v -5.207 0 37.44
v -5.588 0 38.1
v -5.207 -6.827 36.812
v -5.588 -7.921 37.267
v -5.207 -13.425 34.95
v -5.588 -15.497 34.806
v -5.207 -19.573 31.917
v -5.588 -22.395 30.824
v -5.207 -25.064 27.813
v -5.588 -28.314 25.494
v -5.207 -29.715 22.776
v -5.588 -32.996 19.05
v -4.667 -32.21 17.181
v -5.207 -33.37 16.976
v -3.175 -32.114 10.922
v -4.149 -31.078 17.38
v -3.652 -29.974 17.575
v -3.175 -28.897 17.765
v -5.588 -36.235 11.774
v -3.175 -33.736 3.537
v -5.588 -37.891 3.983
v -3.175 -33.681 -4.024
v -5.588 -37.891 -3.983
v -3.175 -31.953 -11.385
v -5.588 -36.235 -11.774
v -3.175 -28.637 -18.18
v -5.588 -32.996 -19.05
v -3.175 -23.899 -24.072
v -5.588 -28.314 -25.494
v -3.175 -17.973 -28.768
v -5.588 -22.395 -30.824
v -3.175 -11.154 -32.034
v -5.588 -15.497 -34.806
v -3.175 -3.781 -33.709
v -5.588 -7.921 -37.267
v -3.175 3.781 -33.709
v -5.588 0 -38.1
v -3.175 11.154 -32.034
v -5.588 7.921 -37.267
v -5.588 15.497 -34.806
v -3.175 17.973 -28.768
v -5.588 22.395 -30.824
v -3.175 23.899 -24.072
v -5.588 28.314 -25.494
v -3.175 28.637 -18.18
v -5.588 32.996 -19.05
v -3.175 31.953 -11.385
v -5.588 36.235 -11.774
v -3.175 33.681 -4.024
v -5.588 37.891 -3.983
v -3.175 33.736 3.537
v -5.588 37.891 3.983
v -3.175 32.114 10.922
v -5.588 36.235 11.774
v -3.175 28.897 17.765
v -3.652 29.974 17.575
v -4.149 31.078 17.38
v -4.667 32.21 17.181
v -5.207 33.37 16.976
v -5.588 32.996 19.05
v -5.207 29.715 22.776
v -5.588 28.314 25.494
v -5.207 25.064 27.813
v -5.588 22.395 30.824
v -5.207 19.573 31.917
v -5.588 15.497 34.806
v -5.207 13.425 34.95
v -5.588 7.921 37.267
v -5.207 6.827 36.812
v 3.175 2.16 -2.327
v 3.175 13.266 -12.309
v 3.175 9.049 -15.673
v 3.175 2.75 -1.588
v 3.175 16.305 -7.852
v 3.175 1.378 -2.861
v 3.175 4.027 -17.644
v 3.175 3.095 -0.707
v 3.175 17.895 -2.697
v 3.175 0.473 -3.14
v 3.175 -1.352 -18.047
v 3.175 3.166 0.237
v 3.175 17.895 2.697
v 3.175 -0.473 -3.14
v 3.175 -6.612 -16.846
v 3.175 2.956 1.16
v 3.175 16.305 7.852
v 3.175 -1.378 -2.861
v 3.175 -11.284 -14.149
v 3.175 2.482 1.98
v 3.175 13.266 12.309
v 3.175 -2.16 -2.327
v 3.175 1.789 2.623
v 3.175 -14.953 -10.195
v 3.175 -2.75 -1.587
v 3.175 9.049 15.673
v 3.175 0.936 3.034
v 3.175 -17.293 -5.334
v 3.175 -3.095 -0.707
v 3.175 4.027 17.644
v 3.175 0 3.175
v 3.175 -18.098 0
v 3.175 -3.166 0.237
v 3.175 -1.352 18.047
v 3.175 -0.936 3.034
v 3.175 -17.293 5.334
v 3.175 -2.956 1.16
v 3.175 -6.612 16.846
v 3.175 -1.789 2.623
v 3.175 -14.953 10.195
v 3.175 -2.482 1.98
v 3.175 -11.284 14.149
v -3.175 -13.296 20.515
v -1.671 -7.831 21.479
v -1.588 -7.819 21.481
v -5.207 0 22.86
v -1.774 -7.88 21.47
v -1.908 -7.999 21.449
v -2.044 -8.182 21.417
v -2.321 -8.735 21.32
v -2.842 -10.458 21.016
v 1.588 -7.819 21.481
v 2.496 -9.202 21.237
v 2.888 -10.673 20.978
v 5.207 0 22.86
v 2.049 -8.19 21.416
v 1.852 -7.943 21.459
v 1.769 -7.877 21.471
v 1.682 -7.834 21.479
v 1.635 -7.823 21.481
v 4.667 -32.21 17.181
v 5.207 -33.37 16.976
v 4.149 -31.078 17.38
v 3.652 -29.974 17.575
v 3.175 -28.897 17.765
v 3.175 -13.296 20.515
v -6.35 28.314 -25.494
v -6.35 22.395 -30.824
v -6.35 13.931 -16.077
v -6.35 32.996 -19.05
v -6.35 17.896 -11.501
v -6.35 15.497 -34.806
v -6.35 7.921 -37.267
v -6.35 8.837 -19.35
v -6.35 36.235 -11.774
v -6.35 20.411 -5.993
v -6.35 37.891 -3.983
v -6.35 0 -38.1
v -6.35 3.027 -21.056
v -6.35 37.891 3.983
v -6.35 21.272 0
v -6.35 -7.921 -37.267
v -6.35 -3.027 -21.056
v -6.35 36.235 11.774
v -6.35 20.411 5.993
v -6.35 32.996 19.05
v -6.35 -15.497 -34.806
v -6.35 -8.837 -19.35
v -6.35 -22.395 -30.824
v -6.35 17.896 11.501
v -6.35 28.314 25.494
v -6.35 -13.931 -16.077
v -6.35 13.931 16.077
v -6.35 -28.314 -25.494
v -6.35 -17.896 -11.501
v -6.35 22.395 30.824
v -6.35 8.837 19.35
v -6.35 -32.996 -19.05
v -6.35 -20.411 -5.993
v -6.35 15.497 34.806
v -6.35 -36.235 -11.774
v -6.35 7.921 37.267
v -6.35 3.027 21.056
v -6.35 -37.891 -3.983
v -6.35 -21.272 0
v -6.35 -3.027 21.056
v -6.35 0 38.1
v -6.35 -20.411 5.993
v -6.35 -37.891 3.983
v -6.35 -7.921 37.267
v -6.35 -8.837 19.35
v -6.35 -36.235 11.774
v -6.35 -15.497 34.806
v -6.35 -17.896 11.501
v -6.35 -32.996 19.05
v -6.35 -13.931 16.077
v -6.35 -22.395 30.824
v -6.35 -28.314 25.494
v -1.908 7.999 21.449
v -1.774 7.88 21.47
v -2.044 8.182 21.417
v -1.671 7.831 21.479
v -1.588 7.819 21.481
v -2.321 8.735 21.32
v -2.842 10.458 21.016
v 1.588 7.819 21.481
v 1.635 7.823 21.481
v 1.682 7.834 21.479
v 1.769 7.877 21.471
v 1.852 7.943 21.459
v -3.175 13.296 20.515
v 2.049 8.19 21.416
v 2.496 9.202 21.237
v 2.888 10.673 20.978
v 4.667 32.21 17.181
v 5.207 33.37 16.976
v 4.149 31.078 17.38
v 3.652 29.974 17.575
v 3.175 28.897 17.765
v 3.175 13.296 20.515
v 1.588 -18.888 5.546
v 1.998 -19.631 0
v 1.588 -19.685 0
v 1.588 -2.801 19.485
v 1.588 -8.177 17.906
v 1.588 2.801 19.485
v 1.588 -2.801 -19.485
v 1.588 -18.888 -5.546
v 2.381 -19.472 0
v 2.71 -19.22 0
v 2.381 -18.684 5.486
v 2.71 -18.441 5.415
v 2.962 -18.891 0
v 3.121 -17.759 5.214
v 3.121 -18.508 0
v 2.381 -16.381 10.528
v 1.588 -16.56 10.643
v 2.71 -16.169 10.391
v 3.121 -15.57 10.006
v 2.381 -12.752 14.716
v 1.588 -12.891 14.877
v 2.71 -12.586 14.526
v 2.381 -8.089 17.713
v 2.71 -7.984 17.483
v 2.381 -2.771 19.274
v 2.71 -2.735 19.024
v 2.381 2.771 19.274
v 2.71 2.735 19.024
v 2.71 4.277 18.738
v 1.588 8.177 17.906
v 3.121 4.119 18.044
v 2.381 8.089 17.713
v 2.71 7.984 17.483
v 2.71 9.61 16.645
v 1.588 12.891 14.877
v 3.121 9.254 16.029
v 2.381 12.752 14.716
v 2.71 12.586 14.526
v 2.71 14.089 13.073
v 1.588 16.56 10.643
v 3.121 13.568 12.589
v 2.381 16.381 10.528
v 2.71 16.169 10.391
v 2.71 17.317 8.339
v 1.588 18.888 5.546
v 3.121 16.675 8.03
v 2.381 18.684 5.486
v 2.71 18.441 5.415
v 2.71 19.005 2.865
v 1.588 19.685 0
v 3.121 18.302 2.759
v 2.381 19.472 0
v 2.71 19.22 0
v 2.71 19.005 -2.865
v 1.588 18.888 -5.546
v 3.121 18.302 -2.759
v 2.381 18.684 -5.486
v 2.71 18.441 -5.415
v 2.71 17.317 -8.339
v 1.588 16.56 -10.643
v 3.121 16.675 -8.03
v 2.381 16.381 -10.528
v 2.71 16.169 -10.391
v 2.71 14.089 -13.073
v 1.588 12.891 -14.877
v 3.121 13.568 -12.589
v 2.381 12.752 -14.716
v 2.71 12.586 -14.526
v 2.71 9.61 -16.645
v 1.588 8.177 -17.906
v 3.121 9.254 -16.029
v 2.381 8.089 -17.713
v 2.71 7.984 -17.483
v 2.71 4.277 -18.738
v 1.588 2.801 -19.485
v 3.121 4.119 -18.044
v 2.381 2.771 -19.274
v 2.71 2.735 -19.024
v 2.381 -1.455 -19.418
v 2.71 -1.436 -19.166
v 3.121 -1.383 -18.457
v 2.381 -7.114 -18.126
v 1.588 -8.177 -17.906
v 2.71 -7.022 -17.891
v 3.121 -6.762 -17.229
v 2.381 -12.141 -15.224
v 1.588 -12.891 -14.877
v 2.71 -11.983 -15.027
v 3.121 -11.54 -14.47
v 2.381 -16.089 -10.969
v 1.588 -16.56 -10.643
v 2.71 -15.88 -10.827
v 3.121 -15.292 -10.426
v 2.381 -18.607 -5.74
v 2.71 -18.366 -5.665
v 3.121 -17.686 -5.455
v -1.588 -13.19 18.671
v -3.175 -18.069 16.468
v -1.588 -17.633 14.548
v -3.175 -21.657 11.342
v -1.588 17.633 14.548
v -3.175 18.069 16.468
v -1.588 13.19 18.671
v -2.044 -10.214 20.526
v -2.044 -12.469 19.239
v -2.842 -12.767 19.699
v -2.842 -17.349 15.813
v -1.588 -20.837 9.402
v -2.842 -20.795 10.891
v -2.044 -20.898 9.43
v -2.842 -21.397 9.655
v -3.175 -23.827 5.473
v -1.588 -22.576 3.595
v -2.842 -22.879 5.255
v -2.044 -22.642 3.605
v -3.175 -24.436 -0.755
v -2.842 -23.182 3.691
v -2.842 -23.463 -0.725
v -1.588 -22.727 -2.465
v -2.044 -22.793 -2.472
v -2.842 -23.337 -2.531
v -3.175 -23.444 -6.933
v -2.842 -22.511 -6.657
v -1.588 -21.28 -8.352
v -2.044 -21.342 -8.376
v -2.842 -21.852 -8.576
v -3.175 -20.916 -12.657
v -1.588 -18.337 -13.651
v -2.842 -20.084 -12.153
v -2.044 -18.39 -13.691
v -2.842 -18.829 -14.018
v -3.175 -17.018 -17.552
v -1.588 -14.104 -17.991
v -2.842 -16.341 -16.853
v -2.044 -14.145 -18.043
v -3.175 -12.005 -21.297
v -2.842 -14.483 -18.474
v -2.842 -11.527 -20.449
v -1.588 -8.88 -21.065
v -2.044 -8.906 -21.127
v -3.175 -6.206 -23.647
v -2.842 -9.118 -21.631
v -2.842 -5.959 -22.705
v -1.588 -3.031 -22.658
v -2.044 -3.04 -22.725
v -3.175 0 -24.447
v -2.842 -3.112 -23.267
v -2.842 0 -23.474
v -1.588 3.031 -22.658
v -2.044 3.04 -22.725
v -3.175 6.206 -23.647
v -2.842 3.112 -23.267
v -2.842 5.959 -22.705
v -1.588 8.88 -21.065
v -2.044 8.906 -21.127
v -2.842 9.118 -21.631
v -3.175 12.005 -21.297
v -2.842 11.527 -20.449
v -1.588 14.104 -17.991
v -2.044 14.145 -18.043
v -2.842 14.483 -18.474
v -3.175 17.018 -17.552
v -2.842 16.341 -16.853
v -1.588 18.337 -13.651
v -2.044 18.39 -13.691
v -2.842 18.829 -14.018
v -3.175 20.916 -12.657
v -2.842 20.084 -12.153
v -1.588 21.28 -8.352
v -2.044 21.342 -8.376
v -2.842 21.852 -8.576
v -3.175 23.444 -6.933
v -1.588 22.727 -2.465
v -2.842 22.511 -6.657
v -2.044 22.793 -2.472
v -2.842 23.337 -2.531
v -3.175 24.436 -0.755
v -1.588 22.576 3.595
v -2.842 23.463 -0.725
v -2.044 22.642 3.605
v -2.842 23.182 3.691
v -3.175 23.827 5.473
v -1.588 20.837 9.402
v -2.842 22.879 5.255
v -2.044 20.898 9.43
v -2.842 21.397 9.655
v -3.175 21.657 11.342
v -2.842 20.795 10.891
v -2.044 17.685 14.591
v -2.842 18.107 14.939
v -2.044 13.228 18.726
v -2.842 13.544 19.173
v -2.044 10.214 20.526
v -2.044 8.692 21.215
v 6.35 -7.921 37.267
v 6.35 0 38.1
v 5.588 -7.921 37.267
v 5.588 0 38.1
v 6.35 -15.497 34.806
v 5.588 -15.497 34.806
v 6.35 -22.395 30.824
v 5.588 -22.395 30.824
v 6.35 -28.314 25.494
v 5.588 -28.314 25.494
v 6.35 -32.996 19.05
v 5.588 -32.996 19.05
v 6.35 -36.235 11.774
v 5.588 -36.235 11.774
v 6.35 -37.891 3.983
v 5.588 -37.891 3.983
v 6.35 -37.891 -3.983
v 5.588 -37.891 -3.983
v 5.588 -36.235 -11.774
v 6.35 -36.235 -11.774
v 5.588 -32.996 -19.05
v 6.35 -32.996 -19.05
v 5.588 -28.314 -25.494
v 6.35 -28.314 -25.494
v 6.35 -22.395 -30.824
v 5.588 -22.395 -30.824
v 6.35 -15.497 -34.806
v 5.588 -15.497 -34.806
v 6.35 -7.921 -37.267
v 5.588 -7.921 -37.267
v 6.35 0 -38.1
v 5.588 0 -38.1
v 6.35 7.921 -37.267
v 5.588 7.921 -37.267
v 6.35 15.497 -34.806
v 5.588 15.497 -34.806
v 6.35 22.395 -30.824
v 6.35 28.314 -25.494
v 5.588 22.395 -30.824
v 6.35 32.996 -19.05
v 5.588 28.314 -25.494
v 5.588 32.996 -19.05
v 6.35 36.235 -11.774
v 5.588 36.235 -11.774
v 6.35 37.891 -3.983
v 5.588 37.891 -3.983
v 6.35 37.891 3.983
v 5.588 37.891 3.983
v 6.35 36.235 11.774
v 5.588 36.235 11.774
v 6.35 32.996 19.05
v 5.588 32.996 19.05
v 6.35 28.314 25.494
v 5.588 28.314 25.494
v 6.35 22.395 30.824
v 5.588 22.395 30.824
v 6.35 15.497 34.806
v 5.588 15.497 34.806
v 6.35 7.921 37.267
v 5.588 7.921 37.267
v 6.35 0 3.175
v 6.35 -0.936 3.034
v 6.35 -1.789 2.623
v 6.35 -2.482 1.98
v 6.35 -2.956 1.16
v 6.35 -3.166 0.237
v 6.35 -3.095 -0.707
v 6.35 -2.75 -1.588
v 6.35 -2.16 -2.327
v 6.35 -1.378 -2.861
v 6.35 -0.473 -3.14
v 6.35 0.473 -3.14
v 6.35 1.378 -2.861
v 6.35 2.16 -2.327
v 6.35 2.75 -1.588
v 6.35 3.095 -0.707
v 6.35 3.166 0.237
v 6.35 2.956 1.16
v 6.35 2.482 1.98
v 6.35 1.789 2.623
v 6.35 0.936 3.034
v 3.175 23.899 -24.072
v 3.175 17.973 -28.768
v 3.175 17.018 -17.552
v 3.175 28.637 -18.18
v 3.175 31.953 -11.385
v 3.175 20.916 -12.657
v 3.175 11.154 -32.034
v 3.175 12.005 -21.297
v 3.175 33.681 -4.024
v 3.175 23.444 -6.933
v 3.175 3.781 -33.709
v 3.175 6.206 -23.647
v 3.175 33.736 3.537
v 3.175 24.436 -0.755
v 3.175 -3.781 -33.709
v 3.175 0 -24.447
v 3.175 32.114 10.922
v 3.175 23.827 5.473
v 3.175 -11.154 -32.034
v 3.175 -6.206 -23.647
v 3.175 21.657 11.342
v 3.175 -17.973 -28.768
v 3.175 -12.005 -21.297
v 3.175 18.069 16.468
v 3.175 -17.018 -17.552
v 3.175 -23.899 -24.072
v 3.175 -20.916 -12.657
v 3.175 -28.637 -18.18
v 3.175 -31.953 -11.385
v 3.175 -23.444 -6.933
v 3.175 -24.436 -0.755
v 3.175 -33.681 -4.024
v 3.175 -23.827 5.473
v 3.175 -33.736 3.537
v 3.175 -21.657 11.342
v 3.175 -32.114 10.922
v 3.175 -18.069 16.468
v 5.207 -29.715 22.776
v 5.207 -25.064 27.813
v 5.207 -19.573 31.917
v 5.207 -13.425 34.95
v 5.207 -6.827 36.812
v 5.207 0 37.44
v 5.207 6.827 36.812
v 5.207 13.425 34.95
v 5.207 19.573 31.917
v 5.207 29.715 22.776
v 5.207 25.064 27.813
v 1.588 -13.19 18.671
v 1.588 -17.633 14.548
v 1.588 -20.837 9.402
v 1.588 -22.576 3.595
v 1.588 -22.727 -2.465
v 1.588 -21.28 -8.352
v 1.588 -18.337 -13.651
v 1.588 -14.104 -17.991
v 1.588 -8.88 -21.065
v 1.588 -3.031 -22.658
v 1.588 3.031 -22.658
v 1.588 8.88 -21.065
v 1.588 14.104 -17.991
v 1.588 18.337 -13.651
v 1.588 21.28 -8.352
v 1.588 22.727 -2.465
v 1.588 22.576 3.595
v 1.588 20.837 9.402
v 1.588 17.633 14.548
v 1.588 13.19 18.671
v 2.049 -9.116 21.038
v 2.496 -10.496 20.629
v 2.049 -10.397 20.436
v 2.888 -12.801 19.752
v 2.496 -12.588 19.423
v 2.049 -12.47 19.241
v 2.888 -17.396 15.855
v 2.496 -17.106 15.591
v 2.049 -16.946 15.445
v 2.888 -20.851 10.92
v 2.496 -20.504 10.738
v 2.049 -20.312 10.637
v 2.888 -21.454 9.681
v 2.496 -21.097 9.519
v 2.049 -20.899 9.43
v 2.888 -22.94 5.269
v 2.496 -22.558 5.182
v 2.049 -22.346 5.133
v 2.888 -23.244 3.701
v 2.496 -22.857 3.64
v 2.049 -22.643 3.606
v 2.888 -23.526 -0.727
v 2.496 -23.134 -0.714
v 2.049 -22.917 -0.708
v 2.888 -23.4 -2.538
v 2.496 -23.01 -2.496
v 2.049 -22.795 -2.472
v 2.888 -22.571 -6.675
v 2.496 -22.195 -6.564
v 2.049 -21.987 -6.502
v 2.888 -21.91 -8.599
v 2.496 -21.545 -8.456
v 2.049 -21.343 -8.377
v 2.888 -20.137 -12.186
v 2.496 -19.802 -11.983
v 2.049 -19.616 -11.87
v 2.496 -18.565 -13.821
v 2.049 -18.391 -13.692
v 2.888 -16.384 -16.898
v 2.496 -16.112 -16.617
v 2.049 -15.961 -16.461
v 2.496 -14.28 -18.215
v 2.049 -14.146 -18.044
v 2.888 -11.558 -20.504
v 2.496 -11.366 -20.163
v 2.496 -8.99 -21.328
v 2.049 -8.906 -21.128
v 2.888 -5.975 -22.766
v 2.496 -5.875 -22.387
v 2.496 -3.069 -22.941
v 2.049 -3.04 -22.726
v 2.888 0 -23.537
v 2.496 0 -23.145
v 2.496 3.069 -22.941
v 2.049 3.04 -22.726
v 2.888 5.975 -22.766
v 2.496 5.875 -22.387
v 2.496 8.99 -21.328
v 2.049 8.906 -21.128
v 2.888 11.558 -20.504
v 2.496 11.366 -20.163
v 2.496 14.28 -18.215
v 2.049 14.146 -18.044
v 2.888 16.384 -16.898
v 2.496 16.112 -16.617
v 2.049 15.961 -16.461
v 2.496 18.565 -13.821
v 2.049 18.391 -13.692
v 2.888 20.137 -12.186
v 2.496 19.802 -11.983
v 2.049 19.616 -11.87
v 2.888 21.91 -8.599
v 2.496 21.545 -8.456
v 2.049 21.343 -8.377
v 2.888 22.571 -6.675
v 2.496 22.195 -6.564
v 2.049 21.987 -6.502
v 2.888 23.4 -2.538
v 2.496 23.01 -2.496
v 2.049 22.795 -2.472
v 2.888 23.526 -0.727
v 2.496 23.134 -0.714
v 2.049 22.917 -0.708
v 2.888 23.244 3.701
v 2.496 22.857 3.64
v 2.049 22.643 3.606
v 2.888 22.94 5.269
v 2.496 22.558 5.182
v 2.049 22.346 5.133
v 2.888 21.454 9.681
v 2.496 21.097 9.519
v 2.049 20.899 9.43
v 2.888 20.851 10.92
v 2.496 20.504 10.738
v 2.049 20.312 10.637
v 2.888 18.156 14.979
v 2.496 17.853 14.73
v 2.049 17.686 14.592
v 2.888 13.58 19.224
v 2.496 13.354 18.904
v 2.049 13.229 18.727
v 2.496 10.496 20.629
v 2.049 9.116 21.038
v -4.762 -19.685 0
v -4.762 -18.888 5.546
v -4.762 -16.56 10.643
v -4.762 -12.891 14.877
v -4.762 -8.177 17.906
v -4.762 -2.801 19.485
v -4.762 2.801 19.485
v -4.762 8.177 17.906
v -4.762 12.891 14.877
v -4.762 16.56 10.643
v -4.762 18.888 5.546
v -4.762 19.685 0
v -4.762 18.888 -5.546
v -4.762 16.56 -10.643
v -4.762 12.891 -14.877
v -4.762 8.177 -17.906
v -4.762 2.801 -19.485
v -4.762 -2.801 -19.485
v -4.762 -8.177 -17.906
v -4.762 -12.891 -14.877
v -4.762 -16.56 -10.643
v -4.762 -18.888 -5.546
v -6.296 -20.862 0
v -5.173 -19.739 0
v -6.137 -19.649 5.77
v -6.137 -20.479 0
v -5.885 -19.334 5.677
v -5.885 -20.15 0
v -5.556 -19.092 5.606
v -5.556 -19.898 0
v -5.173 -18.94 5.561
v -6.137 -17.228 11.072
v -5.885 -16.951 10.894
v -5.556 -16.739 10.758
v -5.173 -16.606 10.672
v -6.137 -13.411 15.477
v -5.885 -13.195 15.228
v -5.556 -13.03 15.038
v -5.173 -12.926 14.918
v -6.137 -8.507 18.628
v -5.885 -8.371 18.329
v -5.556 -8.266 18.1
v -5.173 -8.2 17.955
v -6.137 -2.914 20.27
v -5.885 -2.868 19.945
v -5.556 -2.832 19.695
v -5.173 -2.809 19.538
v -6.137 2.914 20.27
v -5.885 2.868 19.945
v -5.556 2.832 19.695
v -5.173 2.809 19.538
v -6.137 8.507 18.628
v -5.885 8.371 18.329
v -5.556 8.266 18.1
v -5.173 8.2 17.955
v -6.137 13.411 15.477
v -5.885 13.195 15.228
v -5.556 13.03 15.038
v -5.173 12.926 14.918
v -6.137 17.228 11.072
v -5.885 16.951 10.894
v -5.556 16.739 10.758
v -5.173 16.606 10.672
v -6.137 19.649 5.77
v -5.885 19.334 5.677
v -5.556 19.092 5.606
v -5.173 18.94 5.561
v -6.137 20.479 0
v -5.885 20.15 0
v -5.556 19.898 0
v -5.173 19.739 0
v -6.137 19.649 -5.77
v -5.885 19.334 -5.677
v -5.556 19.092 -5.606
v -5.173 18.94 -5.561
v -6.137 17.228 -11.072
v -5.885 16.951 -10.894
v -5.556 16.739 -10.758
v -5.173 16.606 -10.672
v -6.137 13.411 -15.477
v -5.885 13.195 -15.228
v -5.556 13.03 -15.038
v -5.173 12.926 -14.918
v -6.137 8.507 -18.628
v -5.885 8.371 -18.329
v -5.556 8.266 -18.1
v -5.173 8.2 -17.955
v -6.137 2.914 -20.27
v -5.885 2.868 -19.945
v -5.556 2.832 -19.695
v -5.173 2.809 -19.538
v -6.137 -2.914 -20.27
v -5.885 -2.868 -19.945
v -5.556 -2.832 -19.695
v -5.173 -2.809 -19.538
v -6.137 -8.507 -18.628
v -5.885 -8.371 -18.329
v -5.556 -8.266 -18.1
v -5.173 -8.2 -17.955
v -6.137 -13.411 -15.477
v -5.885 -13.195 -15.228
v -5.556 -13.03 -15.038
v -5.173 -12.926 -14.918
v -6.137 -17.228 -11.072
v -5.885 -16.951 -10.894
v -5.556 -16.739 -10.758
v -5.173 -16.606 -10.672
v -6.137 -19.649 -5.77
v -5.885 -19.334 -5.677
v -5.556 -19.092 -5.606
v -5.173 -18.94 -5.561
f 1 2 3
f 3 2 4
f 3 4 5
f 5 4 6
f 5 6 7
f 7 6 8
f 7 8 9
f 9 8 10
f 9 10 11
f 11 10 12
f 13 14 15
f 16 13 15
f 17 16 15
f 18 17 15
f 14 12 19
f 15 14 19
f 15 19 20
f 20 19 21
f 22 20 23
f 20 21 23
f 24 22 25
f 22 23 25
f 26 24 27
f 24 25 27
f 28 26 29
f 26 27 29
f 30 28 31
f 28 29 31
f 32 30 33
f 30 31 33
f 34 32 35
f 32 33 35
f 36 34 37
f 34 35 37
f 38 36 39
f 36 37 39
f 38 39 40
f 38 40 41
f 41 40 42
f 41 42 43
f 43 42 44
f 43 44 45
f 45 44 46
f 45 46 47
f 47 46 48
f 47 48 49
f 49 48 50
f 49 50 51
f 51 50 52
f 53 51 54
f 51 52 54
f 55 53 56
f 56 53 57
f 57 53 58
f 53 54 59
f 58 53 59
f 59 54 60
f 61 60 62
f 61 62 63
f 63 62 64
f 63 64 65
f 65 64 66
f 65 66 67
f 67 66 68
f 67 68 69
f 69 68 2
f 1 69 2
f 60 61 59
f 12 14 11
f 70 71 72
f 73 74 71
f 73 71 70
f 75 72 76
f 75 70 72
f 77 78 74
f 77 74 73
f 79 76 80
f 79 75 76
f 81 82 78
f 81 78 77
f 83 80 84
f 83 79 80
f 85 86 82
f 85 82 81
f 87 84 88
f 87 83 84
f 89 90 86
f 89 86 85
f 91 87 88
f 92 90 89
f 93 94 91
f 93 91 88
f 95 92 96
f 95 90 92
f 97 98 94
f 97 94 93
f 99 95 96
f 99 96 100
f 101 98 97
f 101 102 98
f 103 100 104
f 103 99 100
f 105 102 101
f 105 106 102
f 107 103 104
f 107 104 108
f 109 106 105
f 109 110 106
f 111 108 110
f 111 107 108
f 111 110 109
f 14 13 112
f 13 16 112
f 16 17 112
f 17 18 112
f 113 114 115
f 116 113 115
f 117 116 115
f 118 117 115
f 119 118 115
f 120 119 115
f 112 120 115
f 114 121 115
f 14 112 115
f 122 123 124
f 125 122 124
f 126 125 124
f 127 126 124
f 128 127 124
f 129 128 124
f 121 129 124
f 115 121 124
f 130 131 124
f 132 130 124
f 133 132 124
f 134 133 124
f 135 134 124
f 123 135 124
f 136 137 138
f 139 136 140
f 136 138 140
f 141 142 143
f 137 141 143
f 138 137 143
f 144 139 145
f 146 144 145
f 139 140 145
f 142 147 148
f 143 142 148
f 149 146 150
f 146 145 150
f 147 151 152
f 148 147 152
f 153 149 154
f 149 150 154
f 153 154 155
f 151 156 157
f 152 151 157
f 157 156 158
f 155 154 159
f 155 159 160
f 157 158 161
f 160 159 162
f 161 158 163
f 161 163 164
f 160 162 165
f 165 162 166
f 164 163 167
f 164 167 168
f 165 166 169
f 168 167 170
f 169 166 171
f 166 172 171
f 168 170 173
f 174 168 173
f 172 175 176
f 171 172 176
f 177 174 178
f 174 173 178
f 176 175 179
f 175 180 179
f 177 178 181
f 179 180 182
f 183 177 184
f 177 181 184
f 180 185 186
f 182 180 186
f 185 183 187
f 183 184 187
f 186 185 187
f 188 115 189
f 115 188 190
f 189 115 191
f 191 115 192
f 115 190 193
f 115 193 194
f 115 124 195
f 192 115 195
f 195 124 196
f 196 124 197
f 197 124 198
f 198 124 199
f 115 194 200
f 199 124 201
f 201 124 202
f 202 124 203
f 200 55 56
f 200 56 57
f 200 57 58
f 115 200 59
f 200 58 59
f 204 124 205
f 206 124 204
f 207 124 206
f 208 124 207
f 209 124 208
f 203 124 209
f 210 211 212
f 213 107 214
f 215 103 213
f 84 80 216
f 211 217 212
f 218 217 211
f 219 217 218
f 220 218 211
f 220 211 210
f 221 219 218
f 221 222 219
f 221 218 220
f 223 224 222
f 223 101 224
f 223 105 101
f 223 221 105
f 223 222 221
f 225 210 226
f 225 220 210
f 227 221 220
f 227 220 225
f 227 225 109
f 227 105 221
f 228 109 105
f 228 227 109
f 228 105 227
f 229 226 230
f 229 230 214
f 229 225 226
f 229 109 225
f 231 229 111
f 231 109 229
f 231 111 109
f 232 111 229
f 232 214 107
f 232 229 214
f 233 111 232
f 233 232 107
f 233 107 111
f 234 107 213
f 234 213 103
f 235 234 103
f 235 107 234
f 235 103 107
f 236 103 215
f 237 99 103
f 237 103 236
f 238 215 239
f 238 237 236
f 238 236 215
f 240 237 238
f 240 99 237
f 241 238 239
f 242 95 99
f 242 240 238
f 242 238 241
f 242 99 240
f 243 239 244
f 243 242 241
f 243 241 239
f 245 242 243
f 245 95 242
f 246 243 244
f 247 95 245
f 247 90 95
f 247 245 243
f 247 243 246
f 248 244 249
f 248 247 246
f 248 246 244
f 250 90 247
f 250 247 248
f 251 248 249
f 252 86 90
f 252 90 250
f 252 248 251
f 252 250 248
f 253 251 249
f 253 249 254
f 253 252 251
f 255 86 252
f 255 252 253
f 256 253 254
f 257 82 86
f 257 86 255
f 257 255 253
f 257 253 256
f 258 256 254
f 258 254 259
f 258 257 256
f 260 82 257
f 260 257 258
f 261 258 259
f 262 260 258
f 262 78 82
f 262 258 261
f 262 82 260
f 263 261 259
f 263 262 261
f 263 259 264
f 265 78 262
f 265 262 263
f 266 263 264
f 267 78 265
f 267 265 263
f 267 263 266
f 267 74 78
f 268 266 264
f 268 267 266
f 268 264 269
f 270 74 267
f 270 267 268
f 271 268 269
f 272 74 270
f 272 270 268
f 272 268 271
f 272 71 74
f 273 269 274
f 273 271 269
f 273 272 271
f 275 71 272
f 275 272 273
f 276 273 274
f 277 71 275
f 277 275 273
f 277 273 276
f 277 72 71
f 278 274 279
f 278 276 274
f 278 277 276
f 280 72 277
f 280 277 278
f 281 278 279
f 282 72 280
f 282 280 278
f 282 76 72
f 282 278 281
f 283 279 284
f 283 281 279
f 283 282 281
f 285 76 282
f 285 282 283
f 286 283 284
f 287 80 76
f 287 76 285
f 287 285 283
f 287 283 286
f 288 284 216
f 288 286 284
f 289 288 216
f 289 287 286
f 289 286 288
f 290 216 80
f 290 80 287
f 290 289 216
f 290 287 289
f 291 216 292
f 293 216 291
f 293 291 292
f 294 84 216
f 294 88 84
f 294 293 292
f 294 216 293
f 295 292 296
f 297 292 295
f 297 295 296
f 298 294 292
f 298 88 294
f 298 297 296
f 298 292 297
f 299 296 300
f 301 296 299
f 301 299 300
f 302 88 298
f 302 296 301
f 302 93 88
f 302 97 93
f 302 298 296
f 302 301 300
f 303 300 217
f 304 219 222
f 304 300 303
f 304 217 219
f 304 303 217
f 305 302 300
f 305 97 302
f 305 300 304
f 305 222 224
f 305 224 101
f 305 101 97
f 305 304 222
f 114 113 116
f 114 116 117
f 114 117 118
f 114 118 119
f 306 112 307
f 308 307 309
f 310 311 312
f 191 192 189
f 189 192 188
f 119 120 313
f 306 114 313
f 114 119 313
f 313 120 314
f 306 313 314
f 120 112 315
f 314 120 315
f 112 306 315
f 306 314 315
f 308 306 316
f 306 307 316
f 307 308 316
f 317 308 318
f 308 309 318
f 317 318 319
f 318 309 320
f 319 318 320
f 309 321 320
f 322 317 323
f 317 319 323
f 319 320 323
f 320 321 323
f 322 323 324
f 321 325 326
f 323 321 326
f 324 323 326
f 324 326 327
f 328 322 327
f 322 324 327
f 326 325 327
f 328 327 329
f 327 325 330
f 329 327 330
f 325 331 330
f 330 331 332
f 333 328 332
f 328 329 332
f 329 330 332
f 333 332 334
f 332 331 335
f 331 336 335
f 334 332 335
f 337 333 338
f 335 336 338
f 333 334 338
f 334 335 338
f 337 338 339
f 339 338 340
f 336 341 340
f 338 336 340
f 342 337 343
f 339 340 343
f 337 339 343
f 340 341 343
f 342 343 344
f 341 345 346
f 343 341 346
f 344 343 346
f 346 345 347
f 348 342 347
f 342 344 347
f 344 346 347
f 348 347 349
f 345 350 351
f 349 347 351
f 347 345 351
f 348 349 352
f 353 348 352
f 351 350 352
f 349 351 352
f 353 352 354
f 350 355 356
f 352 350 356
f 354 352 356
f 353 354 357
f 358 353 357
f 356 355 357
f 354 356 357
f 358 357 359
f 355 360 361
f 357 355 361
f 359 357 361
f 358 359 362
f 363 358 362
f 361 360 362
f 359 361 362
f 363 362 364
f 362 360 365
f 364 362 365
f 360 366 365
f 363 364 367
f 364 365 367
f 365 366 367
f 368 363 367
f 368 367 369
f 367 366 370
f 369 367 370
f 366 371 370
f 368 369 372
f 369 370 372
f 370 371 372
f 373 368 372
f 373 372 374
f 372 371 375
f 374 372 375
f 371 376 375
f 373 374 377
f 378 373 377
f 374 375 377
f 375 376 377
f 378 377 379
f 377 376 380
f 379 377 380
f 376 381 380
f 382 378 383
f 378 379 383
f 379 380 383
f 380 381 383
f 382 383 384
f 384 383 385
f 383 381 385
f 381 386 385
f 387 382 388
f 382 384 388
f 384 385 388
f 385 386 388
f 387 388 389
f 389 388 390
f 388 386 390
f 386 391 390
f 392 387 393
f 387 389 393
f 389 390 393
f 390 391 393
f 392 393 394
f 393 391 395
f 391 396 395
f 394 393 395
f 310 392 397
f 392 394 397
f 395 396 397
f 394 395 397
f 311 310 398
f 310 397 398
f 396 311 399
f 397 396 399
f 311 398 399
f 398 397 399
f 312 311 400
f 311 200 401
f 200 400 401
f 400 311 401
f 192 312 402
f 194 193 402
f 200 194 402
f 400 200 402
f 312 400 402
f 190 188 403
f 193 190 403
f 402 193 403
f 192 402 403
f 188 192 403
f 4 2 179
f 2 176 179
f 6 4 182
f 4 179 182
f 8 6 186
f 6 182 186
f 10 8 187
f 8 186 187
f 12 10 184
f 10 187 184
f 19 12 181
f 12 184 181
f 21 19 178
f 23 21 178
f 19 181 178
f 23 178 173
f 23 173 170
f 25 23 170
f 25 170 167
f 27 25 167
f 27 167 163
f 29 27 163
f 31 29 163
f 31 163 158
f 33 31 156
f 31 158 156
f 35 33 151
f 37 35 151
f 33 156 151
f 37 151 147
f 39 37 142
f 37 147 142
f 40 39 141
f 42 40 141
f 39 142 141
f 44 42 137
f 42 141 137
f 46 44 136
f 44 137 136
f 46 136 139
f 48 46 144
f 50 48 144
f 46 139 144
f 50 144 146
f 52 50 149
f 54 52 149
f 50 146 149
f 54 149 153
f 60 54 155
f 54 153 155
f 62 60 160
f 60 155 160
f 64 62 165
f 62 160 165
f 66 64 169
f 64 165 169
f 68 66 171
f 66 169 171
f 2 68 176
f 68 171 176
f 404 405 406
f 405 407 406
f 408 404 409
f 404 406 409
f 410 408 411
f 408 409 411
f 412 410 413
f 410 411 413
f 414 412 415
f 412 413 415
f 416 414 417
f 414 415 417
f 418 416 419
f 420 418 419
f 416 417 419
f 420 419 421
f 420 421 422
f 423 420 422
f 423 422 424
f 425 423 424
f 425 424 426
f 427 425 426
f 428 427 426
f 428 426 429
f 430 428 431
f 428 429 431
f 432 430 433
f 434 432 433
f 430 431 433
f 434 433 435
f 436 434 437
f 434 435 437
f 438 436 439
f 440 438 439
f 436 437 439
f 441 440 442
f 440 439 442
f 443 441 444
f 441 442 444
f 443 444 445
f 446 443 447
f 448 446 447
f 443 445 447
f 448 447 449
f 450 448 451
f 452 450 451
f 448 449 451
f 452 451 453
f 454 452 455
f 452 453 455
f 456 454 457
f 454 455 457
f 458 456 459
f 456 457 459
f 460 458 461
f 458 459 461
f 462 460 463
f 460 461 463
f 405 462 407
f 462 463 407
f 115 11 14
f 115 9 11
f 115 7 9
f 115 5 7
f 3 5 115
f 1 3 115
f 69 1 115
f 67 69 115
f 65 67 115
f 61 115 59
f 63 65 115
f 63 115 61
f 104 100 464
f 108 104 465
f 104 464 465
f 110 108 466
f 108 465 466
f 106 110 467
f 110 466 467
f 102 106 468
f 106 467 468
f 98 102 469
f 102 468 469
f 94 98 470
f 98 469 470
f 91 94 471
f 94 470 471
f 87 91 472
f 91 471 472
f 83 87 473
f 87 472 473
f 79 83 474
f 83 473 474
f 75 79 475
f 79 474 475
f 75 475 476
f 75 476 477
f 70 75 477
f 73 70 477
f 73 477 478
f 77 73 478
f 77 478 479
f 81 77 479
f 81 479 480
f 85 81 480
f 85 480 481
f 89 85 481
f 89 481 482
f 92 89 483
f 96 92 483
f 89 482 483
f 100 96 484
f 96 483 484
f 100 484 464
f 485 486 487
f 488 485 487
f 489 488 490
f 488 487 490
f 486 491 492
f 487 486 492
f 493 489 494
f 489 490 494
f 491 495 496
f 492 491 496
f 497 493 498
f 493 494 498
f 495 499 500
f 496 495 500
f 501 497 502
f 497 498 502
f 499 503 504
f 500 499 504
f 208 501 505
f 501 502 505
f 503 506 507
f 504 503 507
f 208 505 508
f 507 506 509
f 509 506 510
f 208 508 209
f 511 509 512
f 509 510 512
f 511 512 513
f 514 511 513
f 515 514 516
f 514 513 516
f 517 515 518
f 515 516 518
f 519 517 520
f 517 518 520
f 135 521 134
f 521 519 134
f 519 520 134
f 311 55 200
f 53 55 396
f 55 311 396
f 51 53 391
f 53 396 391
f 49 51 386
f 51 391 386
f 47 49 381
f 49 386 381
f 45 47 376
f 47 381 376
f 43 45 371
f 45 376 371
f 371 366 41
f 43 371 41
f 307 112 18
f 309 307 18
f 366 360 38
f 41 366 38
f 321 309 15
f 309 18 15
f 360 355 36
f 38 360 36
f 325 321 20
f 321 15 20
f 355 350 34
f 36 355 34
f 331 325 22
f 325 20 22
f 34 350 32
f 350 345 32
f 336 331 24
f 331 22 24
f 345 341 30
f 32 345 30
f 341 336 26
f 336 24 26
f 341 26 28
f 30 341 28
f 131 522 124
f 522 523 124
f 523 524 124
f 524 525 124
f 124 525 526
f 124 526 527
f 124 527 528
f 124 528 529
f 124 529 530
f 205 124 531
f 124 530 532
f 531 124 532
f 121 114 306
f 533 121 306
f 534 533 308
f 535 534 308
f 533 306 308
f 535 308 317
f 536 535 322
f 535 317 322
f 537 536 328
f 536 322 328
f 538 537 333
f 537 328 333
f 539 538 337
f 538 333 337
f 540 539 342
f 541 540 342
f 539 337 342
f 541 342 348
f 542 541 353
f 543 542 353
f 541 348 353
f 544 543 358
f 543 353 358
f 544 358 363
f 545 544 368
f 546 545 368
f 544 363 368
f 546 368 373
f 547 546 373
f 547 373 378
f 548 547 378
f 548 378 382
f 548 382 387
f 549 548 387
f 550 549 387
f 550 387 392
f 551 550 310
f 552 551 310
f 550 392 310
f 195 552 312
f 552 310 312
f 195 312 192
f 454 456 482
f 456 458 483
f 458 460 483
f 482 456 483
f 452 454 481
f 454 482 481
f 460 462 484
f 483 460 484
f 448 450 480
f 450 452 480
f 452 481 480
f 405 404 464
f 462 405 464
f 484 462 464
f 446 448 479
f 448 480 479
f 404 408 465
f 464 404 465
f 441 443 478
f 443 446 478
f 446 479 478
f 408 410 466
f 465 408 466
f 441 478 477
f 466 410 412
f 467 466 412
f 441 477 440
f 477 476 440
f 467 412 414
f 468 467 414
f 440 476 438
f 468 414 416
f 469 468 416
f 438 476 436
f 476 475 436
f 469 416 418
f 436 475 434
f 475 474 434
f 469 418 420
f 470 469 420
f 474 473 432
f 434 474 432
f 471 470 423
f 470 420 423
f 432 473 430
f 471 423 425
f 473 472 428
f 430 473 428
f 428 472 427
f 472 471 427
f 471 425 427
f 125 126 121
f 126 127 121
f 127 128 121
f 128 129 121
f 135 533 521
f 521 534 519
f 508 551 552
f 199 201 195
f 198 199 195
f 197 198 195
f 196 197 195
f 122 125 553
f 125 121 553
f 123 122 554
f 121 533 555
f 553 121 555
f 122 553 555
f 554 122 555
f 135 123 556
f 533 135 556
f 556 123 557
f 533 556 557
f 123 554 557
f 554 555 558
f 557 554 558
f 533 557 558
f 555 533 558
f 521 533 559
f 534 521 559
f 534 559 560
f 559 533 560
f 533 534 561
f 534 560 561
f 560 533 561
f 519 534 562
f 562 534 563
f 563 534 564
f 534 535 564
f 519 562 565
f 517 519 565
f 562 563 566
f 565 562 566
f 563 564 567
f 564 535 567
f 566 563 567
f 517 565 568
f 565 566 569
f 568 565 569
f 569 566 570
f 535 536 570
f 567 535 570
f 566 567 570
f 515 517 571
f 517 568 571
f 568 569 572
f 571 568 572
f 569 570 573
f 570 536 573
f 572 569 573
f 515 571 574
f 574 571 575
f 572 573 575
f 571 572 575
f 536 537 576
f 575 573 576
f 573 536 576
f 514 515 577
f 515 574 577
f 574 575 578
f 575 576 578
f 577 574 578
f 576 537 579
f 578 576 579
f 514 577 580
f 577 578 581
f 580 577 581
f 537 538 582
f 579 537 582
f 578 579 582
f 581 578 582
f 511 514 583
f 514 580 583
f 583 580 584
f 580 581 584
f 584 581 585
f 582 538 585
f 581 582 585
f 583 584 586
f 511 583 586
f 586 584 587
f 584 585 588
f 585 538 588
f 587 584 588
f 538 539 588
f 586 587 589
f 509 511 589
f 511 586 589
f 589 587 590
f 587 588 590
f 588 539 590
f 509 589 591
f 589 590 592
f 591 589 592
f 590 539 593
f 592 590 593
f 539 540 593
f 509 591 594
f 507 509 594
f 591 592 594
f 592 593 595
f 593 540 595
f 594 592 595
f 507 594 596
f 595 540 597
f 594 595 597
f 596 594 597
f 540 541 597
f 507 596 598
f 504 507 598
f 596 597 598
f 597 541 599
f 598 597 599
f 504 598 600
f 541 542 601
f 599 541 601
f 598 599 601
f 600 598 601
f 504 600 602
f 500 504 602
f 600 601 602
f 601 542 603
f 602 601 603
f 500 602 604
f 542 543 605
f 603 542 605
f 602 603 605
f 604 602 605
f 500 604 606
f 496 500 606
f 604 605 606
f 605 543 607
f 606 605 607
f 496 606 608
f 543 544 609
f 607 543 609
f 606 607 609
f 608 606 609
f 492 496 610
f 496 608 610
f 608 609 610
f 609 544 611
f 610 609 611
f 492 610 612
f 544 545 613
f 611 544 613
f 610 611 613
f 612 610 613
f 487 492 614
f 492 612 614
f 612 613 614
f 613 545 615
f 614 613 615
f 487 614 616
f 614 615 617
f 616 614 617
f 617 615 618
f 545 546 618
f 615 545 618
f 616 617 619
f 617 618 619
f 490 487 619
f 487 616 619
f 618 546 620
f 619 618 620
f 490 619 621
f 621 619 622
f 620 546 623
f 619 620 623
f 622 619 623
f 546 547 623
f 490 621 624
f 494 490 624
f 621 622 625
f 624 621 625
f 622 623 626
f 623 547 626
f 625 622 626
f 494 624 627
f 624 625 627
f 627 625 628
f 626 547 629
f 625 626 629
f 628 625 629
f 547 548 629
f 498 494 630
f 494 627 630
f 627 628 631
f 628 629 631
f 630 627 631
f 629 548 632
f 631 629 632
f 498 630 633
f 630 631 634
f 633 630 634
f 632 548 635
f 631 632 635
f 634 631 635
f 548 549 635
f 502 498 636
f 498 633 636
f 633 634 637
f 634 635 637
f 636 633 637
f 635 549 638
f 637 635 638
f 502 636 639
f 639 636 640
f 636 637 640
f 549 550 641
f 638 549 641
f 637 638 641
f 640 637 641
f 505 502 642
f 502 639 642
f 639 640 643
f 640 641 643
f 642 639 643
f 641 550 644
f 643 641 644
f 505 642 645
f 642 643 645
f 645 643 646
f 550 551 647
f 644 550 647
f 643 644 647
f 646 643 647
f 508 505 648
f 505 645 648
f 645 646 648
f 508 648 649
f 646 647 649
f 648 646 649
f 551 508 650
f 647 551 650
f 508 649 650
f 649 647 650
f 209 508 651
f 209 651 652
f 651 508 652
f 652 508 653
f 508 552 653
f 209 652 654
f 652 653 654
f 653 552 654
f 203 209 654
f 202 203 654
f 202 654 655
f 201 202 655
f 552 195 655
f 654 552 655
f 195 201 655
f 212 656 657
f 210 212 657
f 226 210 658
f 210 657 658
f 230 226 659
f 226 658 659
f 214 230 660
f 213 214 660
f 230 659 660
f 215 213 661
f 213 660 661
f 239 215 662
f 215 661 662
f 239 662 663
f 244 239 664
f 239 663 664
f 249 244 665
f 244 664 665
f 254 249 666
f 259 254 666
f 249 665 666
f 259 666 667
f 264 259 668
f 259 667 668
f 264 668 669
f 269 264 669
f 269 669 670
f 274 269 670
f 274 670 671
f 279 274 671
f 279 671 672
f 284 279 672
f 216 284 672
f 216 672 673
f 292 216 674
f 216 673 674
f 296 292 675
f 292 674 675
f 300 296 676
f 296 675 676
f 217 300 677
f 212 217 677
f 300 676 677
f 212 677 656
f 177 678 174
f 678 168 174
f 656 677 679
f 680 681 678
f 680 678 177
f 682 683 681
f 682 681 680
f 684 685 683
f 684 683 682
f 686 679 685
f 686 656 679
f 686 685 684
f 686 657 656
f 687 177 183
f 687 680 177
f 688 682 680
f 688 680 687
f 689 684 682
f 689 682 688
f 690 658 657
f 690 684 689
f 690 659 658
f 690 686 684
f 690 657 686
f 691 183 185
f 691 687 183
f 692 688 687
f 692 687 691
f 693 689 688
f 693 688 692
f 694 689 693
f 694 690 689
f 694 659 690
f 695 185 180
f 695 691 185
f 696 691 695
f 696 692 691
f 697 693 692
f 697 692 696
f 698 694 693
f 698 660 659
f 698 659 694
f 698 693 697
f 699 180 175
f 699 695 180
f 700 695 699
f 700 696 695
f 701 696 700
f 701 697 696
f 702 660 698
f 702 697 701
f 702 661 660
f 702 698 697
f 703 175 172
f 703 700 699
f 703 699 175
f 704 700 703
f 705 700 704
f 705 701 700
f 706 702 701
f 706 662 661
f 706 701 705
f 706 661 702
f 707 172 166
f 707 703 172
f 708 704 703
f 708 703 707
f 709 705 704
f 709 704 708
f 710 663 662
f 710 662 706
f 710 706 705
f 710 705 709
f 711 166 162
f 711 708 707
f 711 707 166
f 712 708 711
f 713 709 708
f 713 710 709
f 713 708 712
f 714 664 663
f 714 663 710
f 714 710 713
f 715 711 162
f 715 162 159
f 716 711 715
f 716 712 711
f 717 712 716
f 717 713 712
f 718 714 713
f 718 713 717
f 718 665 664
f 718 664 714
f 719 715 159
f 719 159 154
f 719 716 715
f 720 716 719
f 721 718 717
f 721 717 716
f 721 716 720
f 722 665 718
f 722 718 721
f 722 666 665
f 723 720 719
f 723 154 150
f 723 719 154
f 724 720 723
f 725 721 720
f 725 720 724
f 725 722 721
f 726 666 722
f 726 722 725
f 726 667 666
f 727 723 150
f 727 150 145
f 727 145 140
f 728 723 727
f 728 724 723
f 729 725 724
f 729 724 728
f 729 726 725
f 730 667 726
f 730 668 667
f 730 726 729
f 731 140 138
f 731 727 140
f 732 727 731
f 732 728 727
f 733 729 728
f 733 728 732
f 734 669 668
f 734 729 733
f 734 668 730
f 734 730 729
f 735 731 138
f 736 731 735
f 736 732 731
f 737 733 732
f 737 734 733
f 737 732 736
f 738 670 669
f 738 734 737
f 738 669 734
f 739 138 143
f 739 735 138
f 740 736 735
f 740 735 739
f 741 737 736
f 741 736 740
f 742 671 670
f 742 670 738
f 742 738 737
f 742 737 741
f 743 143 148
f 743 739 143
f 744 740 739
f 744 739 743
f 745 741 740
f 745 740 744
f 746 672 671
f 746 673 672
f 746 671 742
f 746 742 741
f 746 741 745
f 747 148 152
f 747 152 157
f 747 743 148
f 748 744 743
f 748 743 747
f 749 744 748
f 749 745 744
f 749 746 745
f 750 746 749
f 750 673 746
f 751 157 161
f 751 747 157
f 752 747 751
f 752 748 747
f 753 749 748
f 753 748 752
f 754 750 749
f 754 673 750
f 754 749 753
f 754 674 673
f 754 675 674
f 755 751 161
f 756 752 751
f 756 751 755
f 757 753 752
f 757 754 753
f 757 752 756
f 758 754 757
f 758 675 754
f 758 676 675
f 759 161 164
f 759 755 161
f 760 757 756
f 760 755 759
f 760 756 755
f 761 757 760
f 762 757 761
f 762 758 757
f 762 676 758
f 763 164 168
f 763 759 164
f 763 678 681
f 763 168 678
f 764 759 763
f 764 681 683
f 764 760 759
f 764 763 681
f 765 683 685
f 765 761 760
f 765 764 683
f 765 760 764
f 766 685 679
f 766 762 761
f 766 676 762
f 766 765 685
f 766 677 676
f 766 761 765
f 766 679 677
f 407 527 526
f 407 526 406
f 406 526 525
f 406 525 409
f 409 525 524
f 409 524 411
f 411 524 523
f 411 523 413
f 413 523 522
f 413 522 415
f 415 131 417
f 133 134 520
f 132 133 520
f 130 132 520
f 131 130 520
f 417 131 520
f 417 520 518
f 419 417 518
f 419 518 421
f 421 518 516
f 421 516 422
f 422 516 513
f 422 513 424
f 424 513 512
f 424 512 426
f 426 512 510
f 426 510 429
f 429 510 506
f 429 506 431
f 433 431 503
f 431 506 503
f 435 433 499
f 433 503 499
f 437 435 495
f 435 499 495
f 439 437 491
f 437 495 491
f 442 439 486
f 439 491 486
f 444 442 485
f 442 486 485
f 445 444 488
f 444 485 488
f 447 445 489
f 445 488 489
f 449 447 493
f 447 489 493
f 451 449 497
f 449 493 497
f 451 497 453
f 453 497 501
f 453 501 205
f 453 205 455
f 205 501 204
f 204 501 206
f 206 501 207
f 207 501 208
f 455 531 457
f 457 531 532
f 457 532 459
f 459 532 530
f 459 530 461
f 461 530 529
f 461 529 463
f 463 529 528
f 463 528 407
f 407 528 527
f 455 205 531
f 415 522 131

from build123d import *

# Parameters (mm, degrees)
F2_R     = 19.685
F2_R_2   = 3.175
F3_DEPTH = 9.525
F4_R     = 1.5875
F6_DEPTH = 5.207


with BuildPart() as f1:
    # F0 (on Front) → F1 (revolve)
    with BuildSketch(Plane.XZ):
        Polygon((-6.35, 38.1), (-6.35, 3.175), (6.35, 3.175), (6.35, 38.1), (5.588, 38.1), (3.175, 33.920561), (3.175, 22.86), (-3.175, 22.86), (-3.175, 33.920561), (-5.588, 38.1), align=None)
    revolve(axis=Axis((0, 0, 0), (1, 0, 0)))

    # F2 (on face) → F3 (cut)
    with BuildSketch(Plane(origin=(-6.35, 0, 0), x_dir=(0, -1, 0), z_dir=(-1, 0, 0))):
        Circle(F2_R)
        Circle(F2_R_2, mode=Mode.SUBTRACT)
    extrude(amount=-F3_DEPTH, mode=Mode.SUBTRACT)

    # F4
    f4_edges = [f1.edges().sort_by_distance(p)[0] for p in [
        (-6.35, 19.685, 0),
        (3.175, 19.685, 0),
        (-3.175, 0, -22.86),
        (3.175, 0, -22.86),
    ]]
    fillet(f4_edges, radius=F4_R)

    # F5 (on Right) → F6 (cut, symmetric)
    with BuildSketch(Plane.YZ):
        Polygon((-34.179726, 16.833192), (0, 22.86), (34.179726, 16.833192), (34.179726, 38.1), (-34.179726, 38.1), align=None)
    extrude(amount=F6_DEPTH, both=True, mode=Mode.SUBTRACT)


solid = f1.part
